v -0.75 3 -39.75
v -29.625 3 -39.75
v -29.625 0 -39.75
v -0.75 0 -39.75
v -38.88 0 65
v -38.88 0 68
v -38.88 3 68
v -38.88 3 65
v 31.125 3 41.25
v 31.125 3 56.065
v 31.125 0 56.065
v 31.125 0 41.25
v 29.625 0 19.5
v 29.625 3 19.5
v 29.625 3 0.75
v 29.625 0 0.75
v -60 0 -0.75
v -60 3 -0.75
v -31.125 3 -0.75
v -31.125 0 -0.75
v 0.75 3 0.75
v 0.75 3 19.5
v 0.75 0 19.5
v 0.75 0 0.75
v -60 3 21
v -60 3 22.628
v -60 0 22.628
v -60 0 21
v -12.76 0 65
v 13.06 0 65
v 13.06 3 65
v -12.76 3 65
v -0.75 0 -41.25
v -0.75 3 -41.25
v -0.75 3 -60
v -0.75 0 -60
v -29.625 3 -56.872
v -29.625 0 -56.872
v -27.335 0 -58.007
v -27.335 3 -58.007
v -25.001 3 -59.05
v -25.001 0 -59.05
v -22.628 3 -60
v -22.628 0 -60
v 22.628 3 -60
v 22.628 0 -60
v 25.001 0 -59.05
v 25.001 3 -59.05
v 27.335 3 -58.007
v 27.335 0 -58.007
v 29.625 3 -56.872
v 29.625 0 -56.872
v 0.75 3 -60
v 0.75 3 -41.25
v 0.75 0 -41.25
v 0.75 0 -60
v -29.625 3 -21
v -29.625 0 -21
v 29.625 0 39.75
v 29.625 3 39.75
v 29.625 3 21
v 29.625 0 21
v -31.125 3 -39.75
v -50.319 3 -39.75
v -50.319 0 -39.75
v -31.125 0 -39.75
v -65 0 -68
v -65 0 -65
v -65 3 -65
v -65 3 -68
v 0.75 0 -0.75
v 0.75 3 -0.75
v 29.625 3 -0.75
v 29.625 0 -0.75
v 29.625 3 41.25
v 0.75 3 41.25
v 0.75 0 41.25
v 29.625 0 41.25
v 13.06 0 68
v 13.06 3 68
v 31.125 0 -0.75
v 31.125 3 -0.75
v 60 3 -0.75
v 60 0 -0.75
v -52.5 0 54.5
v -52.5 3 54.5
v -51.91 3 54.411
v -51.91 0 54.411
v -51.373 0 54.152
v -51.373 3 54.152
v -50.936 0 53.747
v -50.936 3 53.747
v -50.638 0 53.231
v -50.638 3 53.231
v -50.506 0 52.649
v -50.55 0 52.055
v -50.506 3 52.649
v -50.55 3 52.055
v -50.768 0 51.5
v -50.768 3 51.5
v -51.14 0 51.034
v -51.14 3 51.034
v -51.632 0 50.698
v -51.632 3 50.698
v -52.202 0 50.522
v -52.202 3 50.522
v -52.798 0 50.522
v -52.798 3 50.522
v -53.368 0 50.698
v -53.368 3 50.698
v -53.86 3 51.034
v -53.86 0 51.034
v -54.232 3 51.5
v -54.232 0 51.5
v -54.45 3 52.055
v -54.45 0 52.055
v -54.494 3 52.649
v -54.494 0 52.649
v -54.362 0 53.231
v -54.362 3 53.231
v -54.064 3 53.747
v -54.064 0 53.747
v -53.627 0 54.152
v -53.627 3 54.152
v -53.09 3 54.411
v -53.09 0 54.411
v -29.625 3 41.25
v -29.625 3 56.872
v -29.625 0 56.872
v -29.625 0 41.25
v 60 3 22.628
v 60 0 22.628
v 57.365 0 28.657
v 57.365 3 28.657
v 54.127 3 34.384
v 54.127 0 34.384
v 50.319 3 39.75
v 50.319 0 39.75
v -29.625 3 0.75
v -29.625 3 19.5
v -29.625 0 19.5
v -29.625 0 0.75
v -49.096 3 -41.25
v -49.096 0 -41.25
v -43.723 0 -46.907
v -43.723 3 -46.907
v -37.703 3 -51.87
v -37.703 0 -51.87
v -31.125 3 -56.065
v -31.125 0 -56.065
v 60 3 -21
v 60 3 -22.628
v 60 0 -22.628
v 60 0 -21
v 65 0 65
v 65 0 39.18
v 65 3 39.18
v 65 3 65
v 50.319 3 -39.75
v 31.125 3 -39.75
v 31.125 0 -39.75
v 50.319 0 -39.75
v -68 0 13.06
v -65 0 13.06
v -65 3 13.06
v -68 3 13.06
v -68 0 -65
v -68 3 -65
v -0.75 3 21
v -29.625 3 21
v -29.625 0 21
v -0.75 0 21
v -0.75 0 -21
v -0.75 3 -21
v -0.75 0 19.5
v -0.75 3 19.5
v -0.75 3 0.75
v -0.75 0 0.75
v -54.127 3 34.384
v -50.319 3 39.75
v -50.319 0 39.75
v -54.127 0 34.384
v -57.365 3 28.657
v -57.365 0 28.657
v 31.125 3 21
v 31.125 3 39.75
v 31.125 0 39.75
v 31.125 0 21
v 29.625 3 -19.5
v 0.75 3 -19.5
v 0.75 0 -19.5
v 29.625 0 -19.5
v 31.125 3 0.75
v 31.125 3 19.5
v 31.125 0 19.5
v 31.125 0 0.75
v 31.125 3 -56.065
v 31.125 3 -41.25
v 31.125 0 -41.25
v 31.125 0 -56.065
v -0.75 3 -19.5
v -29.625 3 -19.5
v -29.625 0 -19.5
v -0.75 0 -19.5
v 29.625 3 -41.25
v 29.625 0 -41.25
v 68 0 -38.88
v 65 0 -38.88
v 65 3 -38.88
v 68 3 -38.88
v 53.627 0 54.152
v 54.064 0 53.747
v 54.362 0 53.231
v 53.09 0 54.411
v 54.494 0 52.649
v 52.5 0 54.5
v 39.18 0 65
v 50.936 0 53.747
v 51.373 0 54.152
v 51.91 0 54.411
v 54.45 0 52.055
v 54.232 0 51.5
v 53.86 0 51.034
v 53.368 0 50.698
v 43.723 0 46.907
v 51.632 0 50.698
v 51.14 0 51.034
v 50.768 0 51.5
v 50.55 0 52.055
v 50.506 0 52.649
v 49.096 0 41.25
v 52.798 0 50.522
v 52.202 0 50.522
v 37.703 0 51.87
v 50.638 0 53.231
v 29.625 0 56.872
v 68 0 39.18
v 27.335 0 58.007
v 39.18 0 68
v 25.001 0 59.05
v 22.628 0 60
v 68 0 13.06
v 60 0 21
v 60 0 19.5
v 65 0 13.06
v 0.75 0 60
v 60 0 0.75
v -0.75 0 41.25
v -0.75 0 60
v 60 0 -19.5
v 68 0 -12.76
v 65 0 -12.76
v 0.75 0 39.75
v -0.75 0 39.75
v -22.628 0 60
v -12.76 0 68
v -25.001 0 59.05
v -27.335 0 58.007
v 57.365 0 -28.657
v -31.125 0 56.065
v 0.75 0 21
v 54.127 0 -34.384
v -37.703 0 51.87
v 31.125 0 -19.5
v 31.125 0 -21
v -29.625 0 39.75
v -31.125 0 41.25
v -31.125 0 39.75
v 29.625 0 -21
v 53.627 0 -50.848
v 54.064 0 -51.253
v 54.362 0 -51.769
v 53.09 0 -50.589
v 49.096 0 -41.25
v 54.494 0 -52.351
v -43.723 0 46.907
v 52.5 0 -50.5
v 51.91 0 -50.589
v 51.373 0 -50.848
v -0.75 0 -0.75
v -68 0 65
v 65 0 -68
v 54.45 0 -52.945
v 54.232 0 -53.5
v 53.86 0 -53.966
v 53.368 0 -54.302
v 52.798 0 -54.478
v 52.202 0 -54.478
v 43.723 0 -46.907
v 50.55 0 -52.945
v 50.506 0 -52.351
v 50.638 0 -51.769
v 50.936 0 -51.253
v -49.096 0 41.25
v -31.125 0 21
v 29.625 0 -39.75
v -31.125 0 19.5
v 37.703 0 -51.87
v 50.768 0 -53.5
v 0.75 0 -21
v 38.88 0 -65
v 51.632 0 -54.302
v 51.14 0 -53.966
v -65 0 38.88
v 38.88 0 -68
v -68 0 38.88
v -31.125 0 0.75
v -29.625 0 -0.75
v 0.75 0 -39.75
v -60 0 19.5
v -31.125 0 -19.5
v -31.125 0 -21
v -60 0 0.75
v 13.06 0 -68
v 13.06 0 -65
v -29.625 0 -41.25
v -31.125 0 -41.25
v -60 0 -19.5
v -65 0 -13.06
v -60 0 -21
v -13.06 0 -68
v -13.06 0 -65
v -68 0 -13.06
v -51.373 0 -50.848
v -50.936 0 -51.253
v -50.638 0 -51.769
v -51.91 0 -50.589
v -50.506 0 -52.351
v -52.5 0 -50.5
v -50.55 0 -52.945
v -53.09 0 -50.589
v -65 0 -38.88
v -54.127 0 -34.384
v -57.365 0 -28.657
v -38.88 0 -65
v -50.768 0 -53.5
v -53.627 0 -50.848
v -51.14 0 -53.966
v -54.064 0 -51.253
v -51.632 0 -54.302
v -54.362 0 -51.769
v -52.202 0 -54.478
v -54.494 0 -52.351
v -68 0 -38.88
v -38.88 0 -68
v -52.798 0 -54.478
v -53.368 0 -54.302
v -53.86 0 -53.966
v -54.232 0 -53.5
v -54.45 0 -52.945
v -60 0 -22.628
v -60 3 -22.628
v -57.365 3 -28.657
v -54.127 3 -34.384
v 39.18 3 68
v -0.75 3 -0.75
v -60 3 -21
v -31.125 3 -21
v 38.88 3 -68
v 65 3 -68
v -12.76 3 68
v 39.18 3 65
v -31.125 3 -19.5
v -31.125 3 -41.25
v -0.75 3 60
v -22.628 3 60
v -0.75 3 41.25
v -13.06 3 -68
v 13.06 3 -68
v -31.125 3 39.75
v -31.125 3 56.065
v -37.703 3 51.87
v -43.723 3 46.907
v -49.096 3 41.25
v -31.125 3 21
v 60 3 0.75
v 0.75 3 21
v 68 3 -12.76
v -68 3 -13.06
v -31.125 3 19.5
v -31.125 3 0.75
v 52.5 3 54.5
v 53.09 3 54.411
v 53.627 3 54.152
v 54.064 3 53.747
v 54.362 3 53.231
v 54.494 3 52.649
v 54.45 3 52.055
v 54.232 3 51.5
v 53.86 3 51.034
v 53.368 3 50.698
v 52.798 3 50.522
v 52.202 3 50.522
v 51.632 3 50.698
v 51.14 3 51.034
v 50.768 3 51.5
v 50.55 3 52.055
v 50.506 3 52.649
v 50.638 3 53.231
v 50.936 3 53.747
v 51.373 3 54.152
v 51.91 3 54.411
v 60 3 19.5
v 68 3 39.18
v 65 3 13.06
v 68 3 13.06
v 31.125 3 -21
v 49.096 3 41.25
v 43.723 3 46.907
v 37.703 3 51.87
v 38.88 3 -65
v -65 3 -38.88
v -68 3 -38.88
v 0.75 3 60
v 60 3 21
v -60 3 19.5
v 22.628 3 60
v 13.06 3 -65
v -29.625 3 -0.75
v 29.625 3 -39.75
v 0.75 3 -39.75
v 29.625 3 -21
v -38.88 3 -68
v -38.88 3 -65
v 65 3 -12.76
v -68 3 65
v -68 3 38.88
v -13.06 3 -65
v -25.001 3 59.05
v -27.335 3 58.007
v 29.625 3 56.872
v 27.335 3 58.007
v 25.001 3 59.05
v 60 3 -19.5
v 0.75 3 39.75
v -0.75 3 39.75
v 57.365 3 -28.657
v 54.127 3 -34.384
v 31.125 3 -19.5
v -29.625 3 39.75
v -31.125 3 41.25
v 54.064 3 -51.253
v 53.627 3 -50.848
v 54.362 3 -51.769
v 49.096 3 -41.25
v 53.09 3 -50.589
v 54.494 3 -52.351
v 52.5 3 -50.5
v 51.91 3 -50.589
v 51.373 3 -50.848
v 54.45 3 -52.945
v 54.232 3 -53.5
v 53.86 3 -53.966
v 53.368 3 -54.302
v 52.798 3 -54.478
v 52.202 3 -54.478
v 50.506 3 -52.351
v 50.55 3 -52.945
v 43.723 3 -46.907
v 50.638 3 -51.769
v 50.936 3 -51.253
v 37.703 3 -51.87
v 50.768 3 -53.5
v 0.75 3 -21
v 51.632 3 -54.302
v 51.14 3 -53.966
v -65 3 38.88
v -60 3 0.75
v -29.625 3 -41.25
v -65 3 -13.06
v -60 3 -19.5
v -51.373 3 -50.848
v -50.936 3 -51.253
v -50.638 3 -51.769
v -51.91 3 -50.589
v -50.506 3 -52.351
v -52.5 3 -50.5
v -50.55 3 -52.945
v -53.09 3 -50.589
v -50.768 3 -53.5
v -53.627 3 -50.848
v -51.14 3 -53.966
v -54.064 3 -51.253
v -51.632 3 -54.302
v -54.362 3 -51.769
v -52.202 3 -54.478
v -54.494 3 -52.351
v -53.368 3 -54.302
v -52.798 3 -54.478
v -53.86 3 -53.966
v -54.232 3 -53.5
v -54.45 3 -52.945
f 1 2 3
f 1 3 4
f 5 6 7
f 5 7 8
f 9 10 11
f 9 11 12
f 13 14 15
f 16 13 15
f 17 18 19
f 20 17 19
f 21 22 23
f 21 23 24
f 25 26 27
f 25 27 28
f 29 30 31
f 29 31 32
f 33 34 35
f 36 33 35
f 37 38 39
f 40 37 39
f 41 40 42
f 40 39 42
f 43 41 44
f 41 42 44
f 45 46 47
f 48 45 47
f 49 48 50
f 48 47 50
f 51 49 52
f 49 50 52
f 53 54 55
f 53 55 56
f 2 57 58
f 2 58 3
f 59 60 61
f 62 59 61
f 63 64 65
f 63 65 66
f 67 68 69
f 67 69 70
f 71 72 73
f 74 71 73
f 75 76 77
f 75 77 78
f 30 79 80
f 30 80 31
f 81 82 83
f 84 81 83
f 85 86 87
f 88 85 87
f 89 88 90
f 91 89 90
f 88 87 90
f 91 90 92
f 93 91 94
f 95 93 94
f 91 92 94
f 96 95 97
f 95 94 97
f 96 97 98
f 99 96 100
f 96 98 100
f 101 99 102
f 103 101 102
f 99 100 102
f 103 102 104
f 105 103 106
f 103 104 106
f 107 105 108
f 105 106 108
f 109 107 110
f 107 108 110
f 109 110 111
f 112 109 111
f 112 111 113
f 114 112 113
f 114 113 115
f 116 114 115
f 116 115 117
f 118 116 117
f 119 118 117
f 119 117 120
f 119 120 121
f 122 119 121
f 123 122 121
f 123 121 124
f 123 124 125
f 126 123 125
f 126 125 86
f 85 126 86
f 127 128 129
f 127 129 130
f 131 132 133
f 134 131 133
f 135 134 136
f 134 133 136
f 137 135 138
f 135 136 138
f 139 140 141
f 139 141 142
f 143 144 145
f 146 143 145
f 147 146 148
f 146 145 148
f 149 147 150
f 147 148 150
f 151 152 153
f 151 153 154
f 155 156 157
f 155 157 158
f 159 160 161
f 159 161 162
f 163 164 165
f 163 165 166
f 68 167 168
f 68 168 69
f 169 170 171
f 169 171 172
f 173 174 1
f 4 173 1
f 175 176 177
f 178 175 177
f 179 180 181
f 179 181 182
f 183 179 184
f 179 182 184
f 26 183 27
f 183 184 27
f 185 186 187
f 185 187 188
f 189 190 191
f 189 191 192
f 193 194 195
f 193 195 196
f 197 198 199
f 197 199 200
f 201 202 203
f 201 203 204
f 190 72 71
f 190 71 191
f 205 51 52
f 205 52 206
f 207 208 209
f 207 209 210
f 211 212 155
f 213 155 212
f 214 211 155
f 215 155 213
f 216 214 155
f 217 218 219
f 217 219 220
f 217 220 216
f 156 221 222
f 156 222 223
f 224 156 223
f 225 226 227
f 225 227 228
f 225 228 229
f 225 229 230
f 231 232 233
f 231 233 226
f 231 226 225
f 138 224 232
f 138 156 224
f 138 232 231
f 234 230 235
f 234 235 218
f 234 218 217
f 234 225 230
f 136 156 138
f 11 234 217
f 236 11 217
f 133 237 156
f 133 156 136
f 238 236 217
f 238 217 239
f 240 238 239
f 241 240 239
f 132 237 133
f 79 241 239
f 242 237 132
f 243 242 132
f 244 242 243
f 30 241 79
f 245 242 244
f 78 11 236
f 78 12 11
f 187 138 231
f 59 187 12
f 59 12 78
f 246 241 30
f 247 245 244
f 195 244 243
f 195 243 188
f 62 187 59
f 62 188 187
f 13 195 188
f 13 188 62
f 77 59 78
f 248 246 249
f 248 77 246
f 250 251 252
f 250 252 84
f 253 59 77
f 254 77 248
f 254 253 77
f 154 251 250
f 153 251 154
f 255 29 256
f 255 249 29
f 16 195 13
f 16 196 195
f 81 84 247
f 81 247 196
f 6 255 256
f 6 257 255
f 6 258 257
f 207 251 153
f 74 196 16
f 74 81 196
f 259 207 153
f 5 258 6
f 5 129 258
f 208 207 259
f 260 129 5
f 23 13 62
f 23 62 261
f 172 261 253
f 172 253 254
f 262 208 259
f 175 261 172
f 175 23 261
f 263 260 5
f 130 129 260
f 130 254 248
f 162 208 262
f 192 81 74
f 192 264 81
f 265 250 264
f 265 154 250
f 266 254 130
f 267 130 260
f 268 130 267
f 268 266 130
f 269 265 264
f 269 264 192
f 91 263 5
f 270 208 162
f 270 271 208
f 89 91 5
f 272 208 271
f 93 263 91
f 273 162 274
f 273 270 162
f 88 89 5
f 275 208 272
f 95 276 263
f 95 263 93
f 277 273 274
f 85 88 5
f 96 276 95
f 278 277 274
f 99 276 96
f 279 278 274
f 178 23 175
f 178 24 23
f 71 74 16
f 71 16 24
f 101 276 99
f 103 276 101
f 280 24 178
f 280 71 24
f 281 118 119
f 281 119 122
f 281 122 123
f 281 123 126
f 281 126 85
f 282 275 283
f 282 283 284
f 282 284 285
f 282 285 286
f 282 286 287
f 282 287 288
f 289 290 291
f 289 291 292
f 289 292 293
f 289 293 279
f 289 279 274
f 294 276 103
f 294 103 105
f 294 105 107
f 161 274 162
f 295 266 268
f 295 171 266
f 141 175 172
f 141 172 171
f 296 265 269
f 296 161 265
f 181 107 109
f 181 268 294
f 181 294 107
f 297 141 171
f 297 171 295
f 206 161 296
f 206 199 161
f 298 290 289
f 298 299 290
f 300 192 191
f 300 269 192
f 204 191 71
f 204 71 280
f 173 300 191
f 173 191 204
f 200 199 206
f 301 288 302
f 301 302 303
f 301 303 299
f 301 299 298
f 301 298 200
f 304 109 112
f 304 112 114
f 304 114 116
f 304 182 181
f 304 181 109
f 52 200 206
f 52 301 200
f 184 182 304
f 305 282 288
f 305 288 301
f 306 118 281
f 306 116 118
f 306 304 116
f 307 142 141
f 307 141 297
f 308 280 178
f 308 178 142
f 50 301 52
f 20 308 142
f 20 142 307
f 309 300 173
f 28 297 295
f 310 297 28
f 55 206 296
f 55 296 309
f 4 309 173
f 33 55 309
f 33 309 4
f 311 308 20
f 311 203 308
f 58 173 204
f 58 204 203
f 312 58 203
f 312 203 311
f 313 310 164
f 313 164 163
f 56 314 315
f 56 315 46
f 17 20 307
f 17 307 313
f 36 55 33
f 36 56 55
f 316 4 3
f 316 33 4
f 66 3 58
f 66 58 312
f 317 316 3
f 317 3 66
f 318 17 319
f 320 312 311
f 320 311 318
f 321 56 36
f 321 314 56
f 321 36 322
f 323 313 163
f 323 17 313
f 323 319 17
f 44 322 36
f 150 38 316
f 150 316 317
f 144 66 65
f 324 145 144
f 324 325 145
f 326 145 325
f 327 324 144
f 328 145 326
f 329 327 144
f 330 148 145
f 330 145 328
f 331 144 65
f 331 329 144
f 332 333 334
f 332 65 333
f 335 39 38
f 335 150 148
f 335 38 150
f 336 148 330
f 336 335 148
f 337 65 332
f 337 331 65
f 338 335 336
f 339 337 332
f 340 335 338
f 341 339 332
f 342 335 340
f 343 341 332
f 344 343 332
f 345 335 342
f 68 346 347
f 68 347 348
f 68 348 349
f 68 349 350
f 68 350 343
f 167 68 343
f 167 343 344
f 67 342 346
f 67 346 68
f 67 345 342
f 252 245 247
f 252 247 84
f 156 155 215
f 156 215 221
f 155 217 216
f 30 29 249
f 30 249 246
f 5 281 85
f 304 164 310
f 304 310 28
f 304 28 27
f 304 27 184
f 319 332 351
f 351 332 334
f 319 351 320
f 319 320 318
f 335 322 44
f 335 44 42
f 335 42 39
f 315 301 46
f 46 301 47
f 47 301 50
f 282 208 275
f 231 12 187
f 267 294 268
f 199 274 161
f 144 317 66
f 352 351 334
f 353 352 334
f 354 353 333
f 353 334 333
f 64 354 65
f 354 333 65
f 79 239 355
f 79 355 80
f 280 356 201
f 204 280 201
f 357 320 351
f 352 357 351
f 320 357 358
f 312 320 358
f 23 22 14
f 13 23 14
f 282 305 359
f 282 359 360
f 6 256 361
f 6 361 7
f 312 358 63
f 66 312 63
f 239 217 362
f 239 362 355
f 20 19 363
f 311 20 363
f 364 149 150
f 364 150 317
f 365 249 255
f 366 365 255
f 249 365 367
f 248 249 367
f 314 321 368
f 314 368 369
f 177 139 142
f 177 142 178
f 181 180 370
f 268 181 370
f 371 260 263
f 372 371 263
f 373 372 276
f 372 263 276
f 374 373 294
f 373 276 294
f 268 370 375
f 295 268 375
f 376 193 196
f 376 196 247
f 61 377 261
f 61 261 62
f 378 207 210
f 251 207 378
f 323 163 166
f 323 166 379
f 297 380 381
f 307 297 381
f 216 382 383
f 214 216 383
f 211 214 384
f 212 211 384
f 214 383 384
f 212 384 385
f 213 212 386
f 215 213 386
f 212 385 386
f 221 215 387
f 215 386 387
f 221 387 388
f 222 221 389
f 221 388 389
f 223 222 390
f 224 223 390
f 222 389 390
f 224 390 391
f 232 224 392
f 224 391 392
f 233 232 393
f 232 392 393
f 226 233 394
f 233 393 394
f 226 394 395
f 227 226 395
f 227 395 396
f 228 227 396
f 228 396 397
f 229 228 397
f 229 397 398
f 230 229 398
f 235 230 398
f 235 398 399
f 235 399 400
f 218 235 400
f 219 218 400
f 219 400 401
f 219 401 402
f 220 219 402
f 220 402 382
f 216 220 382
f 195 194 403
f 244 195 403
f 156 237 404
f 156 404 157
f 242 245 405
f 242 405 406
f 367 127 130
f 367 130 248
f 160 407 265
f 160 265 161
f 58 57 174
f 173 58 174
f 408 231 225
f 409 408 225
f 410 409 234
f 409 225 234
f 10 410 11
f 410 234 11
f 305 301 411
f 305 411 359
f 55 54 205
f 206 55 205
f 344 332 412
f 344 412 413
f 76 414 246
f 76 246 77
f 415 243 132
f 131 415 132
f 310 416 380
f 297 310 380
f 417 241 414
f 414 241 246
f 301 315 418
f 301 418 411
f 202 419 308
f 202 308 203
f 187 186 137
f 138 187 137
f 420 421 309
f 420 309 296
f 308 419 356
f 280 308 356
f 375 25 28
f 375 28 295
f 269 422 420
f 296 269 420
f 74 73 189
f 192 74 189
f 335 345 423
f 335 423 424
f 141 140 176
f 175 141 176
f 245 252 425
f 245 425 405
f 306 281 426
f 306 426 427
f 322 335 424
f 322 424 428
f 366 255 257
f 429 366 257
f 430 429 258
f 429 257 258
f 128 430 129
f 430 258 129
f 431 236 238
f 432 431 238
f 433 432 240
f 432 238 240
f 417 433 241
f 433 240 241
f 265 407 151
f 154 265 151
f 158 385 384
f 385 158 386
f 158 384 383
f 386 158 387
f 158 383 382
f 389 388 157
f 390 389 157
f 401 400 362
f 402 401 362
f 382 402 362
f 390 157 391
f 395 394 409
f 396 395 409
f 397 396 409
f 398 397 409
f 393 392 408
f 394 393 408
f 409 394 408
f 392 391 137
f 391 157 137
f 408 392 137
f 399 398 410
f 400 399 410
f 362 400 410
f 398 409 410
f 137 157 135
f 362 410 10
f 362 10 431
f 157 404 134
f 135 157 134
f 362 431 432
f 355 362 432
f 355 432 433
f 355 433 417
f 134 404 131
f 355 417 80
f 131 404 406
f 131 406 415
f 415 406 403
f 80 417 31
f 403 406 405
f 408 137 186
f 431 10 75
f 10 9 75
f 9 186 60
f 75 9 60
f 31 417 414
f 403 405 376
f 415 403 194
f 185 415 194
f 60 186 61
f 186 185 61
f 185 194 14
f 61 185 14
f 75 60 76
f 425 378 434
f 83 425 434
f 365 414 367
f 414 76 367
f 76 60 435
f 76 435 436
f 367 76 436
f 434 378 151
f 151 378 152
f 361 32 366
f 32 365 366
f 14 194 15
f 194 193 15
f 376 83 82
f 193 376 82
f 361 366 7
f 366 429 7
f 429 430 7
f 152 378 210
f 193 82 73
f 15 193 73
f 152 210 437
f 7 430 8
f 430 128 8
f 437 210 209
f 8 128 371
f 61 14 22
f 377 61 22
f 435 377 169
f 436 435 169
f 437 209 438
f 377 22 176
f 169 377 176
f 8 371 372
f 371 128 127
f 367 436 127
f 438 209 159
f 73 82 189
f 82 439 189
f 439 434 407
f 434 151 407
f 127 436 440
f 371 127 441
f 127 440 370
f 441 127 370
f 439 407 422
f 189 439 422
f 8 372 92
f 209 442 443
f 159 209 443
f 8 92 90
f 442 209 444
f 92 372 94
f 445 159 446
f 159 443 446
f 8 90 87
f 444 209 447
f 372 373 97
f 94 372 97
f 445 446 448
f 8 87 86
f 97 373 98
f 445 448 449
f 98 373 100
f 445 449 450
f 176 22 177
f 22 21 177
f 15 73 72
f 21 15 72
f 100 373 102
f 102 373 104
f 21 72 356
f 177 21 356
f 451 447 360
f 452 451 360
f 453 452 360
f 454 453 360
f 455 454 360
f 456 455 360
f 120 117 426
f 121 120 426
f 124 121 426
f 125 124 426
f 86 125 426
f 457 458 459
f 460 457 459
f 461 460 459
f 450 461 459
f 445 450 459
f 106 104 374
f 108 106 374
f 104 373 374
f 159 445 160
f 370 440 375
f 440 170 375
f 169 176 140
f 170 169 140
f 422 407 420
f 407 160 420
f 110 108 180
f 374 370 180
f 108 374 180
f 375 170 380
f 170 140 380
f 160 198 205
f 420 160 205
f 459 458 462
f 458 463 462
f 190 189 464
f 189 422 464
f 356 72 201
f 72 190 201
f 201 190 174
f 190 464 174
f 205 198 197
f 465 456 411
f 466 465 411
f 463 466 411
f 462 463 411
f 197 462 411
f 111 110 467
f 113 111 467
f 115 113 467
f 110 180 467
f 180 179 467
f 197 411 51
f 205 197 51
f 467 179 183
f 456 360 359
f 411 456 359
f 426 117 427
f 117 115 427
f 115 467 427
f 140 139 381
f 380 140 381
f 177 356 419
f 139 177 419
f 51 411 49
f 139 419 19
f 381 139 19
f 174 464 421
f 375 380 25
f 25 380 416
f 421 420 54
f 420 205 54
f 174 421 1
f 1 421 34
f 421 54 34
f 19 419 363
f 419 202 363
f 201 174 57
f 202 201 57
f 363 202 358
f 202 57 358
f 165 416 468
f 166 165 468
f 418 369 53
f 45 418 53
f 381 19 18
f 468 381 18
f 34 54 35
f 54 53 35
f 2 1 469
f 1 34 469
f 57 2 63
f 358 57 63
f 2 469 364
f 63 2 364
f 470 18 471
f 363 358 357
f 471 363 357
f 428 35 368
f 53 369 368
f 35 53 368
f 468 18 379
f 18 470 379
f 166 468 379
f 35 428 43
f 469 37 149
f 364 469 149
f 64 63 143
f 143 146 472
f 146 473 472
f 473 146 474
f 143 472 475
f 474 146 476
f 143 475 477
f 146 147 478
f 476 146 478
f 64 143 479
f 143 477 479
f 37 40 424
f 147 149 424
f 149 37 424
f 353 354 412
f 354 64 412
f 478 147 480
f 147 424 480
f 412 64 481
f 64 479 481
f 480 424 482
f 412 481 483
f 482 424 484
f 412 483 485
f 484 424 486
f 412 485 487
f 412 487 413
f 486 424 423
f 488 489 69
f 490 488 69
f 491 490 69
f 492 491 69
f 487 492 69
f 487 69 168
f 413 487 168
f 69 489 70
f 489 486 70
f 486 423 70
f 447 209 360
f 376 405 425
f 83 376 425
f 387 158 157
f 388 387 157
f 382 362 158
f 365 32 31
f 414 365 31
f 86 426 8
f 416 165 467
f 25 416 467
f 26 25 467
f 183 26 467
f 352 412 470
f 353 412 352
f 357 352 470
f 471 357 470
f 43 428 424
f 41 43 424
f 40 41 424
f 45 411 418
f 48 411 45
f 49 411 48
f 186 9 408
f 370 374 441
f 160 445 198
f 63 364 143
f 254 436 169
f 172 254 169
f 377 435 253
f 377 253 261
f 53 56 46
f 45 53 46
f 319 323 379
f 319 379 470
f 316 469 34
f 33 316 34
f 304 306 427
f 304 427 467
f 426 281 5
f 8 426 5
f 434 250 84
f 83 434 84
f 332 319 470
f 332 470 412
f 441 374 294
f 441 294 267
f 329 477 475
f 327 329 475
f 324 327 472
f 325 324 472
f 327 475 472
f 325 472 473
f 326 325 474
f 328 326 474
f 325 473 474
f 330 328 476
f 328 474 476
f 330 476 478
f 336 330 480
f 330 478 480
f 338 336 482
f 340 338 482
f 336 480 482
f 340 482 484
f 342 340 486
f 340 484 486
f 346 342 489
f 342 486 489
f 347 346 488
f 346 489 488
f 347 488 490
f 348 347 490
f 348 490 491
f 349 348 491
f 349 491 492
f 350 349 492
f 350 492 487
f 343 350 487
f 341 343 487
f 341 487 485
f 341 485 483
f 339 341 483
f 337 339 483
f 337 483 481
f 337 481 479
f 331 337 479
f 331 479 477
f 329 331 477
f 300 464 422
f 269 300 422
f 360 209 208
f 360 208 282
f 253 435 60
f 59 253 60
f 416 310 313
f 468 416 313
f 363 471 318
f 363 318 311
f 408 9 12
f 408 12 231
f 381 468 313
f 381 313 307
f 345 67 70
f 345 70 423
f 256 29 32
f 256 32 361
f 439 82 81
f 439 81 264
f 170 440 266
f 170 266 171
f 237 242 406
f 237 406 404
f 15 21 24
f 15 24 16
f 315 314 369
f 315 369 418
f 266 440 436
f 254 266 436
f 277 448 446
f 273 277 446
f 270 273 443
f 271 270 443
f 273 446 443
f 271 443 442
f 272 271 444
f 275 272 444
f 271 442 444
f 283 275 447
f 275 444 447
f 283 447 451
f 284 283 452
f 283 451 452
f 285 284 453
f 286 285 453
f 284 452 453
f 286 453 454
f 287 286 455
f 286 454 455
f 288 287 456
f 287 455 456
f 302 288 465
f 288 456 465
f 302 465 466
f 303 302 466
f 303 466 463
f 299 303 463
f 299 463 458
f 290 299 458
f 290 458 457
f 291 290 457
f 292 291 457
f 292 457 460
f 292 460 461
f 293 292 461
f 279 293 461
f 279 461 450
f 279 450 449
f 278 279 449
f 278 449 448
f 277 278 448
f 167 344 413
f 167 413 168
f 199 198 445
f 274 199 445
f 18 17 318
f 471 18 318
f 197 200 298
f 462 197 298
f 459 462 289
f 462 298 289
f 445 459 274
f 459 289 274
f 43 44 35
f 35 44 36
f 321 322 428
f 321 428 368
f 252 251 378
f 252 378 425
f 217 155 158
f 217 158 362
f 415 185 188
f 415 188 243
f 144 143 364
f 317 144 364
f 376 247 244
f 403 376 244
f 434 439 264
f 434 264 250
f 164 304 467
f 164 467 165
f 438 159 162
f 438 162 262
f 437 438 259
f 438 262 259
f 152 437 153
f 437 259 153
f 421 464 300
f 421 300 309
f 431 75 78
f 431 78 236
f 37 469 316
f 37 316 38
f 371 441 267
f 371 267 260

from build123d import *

# Parameters (mm, degrees)
BOSS_EXTRUDE1_DEPTH = 3
SKETCH2_W           = 130
SKETCH2_H           = 1.5
BOSS_EXTRUDE2_DEPTH = 3
SKETCH3_W           = 1.5
SKETCH3_H           = 18.75
BOSS_EXTRUDE3_DEPTH = 3
SKETCH4_R           = 2
CUT_EXTRUDE1_DEPTH  = 97.213304693


with BuildPart() as part:
    # Sketch1 → Boss-Extrude1 (new body)
    with BuildSketch(Plane(origin=(0, 0, 0), x_dir=(1, 0, 0), z_dir=(0, 1, 0))):
        Polygon((65, 38.88), (68, 38.88), (68, 12.76), (65, 12.76), (65, -13.06), (68, -13.06), (68, -39.18), (65, -39.18), (65, -65), (39.18, -65), (39.18, -68), (13.06, -68), (13.06, -65), (-12.76, -65), (-12.76, -68), (-38.88, -68), (-38.88, -65), (-64.7, -65), (-68, -65), (-68, -38.88), (-65, -38.88), (-65, -13.06), (-68, -13.06), (-68, 13.06), (-65, 13.06), (-65, 38.88), (-68, 38.88), (-68, 65), (-65, 65), (-65, 68), (-38.88, 68), (-38.88, 65), (-13.06, 65), (-13.06, 68), (13.06, 68), (13.06, 65), (38.88, 65), (38.88, 68), (65, 68), (65, 64.7), align=None)
        with BuildLine():
            Line((22.627762262, -60), (-22.627762262, -60))
            ThreePointArc((-22.627762262, -60), (-45.343222344, -45.343222344), (-60, -22.627762262))
            Line((-60, -22.627762262), (-60, 22.627762262))
            ThreePointArc((-60, 22.627762262), (-45.343222344, 45.343222344), (-22.627762262, 60))
            Line((-22.627762262, 60), (22.627762262, 60))
            ThreePointArc((22.627762262, 60), (45.343222344, 45.343222344), (60, 22.627762262))
            Line((60, 22.627762262), (60, -22.627762262))
            ThreePointArc((60, -22.627762262), (45.343222344, -45.343222344), (22.627762262, -60))
        make_face(mode=Mode.SUBTRACT)
    extrude(amount=BOSS_EXTRUDE1_DEPTH)

    # Sketch2 → Boss-Extrude2 (add, through all)
    with BuildSketch(Plane(origin=(0, 3, 0), x_dir=(1, 0, 0), z_dir=(0, 1, 0))):
        with Locations((0, 60.75)):
            Rectangle(SKETCH2_W, SKETCH2_H)
        with Locations((0, 40.5)):
            Rectangle(SKETCH2_W, SKETCH2_H)
        with Locations((0, 20.25)):
            Rectangle(SKETCH2_W, SKETCH2_H)
        Rectangle(SKETCH2_W, SKETCH2_H)
        with Locations((0, -20.25)):
            Rectangle(SKETCH2_W, SKETCH2_H)
        with Locations((0, -40.5)):
            Rectangle(SKETCH2_W, SKETCH2_H)
        with Locations((0, -60.75)):
            Rectangle(SKETCH2_W, SKETCH2_H)
    extrude(amount=-BOSS_EXTRUDE2_DEPTH)

    # Sketch3 → Boss-Extrude3 (add, through all)
    with BuildSketch(Plane(origin=(0, 3, 0), x_dir=(1, 0, 0), z_dir=(0, 1, 0))):
        with Locations((-30.375, -30.375)):
            Rectangle(SKETCH3_W, SKETCH3_H)
        with Locations((-30.375, -10.125)):
            Rectangle(SKETCH3_W, SKETCH3_H)
        with BuildLine():
            Line((-29.625, -41.25), (-31.125, -41.25))
            Line((-31.125, -41.25), (-31.125, -56.064694773))
            ThreePointArc((-31.125, -56.064694773), (-30.377679063, -56.473110768), (-29.625, -56.87156583))
            Line((-29.625, -56.87156583), (-29.625, -41.25))
        make_face()
        with Locations((0, -30.375)):
            Rectangle(SKETCH3_W, SKETCH3_H)
        with Locations((-30.375, 30.375)):
            Rectangle(SKETCH3_W, SKETCH3_H)
        with Locations((-30.375, 10.125)):
            Rectangle(SKETCH3_W, SKETCH3_H)
        with Locations((0, -10.125)):
            Rectangle(SKETCH3_W, SKETCH3_H)
        with Locations((0, -50.625)):
            Rectangle(SKETCH3_W, SKETCH3_H)
        with BuildLine():
            Line((-31.125, 56.064694773), (-31.125, 41.25))
            Line((-31.125, 41.25), (-29.625, 41.25))
            Line((-29.625, 41.25), (-29.625, 56.87156583))
            ThreePointArc((-29.625, 56.87156583), (-30.377679063, 56.473110768), (-31.125, 56.064694773))
        make_face()
        with Locations((30.375, -30.375)):
            Rectangle(SKETCH3_W, SKETCH3_H)
        with Locations((0, 30.375)):
            Rectangle(SKETCH3_W, SKETCH3_H)
        with Locations((0, 10.125)):
            Rectangle(SKETCH3_W, SKETCH3_H)
        with Locations((30.375, -10.125)):
            Rectangle(SKETCH3_W, SKETCH3_H)
        with BuildLine():
            Line((31.125, -41.25), (29.625, -41.25))
            Line((29.625, -41.25), (29.625, -56.87156583))
            ThreePointArc((29.625, -56.87156583), (30.377679063, -56.473110768), (31.125, -56.064694773))
            Line((31.125, -56.064694773), (31.125, -41.25))
        make_face()
        with Locations((0, 50.625)):
            Rectangle(SKETCH3_W, SKETCH3_H)
        with Locations((30.375, 30.375)):
            Rectangle(SKETCH3_W, SKETCH3_H)
        with Locations((30.375, 10.125)):
            Rectangle(SKETCH3_W, SKETCH3_H)
        with BuildLine():
            Line((29.625, 56.87156583), (29.625, 41.25))
            Line((29.625, 41.25), (31.125, 41.25))
            Line((31.125, 41.25), (31.125, 56.064694773))
            ThreePointArc((31.125, 56.064694773), (30.377679063, 56.473110768), (29.625, 56.87156583))
        make_face()
    extrude(amount=-BOSS_EXTRUDE3_DEPTH)

    # Sketch4 → Cut-Extrude1 (cut, through all)
    with BuildSketch(Plane(origin=(0, 3, 0), x_dir=(1, 0, 0), z_dir=(0, 1, 0))):
        with Locations(Location((-52.5, 52.5, 0), (0, 0, 270))):
            Circle(SKETCH4_R)
        with Locations(Location((52.5, 52.5, 0), (0, 0, 270))):
            Circle(SKETCH4_R)
        with Locations(Location((52.5, -52.5, 0), (0, 0, 270))):
            Circle(SKETCH4_R)
        with Locations(Location((-52.5, -52.5, 0), (0, 0, 270))):
            Circle(SKETCH4_R)
    extrude(amount=-CUT_EXTRUDE1_DEPTH, mode=Mode.SUBTRACT)


solid = part.part
